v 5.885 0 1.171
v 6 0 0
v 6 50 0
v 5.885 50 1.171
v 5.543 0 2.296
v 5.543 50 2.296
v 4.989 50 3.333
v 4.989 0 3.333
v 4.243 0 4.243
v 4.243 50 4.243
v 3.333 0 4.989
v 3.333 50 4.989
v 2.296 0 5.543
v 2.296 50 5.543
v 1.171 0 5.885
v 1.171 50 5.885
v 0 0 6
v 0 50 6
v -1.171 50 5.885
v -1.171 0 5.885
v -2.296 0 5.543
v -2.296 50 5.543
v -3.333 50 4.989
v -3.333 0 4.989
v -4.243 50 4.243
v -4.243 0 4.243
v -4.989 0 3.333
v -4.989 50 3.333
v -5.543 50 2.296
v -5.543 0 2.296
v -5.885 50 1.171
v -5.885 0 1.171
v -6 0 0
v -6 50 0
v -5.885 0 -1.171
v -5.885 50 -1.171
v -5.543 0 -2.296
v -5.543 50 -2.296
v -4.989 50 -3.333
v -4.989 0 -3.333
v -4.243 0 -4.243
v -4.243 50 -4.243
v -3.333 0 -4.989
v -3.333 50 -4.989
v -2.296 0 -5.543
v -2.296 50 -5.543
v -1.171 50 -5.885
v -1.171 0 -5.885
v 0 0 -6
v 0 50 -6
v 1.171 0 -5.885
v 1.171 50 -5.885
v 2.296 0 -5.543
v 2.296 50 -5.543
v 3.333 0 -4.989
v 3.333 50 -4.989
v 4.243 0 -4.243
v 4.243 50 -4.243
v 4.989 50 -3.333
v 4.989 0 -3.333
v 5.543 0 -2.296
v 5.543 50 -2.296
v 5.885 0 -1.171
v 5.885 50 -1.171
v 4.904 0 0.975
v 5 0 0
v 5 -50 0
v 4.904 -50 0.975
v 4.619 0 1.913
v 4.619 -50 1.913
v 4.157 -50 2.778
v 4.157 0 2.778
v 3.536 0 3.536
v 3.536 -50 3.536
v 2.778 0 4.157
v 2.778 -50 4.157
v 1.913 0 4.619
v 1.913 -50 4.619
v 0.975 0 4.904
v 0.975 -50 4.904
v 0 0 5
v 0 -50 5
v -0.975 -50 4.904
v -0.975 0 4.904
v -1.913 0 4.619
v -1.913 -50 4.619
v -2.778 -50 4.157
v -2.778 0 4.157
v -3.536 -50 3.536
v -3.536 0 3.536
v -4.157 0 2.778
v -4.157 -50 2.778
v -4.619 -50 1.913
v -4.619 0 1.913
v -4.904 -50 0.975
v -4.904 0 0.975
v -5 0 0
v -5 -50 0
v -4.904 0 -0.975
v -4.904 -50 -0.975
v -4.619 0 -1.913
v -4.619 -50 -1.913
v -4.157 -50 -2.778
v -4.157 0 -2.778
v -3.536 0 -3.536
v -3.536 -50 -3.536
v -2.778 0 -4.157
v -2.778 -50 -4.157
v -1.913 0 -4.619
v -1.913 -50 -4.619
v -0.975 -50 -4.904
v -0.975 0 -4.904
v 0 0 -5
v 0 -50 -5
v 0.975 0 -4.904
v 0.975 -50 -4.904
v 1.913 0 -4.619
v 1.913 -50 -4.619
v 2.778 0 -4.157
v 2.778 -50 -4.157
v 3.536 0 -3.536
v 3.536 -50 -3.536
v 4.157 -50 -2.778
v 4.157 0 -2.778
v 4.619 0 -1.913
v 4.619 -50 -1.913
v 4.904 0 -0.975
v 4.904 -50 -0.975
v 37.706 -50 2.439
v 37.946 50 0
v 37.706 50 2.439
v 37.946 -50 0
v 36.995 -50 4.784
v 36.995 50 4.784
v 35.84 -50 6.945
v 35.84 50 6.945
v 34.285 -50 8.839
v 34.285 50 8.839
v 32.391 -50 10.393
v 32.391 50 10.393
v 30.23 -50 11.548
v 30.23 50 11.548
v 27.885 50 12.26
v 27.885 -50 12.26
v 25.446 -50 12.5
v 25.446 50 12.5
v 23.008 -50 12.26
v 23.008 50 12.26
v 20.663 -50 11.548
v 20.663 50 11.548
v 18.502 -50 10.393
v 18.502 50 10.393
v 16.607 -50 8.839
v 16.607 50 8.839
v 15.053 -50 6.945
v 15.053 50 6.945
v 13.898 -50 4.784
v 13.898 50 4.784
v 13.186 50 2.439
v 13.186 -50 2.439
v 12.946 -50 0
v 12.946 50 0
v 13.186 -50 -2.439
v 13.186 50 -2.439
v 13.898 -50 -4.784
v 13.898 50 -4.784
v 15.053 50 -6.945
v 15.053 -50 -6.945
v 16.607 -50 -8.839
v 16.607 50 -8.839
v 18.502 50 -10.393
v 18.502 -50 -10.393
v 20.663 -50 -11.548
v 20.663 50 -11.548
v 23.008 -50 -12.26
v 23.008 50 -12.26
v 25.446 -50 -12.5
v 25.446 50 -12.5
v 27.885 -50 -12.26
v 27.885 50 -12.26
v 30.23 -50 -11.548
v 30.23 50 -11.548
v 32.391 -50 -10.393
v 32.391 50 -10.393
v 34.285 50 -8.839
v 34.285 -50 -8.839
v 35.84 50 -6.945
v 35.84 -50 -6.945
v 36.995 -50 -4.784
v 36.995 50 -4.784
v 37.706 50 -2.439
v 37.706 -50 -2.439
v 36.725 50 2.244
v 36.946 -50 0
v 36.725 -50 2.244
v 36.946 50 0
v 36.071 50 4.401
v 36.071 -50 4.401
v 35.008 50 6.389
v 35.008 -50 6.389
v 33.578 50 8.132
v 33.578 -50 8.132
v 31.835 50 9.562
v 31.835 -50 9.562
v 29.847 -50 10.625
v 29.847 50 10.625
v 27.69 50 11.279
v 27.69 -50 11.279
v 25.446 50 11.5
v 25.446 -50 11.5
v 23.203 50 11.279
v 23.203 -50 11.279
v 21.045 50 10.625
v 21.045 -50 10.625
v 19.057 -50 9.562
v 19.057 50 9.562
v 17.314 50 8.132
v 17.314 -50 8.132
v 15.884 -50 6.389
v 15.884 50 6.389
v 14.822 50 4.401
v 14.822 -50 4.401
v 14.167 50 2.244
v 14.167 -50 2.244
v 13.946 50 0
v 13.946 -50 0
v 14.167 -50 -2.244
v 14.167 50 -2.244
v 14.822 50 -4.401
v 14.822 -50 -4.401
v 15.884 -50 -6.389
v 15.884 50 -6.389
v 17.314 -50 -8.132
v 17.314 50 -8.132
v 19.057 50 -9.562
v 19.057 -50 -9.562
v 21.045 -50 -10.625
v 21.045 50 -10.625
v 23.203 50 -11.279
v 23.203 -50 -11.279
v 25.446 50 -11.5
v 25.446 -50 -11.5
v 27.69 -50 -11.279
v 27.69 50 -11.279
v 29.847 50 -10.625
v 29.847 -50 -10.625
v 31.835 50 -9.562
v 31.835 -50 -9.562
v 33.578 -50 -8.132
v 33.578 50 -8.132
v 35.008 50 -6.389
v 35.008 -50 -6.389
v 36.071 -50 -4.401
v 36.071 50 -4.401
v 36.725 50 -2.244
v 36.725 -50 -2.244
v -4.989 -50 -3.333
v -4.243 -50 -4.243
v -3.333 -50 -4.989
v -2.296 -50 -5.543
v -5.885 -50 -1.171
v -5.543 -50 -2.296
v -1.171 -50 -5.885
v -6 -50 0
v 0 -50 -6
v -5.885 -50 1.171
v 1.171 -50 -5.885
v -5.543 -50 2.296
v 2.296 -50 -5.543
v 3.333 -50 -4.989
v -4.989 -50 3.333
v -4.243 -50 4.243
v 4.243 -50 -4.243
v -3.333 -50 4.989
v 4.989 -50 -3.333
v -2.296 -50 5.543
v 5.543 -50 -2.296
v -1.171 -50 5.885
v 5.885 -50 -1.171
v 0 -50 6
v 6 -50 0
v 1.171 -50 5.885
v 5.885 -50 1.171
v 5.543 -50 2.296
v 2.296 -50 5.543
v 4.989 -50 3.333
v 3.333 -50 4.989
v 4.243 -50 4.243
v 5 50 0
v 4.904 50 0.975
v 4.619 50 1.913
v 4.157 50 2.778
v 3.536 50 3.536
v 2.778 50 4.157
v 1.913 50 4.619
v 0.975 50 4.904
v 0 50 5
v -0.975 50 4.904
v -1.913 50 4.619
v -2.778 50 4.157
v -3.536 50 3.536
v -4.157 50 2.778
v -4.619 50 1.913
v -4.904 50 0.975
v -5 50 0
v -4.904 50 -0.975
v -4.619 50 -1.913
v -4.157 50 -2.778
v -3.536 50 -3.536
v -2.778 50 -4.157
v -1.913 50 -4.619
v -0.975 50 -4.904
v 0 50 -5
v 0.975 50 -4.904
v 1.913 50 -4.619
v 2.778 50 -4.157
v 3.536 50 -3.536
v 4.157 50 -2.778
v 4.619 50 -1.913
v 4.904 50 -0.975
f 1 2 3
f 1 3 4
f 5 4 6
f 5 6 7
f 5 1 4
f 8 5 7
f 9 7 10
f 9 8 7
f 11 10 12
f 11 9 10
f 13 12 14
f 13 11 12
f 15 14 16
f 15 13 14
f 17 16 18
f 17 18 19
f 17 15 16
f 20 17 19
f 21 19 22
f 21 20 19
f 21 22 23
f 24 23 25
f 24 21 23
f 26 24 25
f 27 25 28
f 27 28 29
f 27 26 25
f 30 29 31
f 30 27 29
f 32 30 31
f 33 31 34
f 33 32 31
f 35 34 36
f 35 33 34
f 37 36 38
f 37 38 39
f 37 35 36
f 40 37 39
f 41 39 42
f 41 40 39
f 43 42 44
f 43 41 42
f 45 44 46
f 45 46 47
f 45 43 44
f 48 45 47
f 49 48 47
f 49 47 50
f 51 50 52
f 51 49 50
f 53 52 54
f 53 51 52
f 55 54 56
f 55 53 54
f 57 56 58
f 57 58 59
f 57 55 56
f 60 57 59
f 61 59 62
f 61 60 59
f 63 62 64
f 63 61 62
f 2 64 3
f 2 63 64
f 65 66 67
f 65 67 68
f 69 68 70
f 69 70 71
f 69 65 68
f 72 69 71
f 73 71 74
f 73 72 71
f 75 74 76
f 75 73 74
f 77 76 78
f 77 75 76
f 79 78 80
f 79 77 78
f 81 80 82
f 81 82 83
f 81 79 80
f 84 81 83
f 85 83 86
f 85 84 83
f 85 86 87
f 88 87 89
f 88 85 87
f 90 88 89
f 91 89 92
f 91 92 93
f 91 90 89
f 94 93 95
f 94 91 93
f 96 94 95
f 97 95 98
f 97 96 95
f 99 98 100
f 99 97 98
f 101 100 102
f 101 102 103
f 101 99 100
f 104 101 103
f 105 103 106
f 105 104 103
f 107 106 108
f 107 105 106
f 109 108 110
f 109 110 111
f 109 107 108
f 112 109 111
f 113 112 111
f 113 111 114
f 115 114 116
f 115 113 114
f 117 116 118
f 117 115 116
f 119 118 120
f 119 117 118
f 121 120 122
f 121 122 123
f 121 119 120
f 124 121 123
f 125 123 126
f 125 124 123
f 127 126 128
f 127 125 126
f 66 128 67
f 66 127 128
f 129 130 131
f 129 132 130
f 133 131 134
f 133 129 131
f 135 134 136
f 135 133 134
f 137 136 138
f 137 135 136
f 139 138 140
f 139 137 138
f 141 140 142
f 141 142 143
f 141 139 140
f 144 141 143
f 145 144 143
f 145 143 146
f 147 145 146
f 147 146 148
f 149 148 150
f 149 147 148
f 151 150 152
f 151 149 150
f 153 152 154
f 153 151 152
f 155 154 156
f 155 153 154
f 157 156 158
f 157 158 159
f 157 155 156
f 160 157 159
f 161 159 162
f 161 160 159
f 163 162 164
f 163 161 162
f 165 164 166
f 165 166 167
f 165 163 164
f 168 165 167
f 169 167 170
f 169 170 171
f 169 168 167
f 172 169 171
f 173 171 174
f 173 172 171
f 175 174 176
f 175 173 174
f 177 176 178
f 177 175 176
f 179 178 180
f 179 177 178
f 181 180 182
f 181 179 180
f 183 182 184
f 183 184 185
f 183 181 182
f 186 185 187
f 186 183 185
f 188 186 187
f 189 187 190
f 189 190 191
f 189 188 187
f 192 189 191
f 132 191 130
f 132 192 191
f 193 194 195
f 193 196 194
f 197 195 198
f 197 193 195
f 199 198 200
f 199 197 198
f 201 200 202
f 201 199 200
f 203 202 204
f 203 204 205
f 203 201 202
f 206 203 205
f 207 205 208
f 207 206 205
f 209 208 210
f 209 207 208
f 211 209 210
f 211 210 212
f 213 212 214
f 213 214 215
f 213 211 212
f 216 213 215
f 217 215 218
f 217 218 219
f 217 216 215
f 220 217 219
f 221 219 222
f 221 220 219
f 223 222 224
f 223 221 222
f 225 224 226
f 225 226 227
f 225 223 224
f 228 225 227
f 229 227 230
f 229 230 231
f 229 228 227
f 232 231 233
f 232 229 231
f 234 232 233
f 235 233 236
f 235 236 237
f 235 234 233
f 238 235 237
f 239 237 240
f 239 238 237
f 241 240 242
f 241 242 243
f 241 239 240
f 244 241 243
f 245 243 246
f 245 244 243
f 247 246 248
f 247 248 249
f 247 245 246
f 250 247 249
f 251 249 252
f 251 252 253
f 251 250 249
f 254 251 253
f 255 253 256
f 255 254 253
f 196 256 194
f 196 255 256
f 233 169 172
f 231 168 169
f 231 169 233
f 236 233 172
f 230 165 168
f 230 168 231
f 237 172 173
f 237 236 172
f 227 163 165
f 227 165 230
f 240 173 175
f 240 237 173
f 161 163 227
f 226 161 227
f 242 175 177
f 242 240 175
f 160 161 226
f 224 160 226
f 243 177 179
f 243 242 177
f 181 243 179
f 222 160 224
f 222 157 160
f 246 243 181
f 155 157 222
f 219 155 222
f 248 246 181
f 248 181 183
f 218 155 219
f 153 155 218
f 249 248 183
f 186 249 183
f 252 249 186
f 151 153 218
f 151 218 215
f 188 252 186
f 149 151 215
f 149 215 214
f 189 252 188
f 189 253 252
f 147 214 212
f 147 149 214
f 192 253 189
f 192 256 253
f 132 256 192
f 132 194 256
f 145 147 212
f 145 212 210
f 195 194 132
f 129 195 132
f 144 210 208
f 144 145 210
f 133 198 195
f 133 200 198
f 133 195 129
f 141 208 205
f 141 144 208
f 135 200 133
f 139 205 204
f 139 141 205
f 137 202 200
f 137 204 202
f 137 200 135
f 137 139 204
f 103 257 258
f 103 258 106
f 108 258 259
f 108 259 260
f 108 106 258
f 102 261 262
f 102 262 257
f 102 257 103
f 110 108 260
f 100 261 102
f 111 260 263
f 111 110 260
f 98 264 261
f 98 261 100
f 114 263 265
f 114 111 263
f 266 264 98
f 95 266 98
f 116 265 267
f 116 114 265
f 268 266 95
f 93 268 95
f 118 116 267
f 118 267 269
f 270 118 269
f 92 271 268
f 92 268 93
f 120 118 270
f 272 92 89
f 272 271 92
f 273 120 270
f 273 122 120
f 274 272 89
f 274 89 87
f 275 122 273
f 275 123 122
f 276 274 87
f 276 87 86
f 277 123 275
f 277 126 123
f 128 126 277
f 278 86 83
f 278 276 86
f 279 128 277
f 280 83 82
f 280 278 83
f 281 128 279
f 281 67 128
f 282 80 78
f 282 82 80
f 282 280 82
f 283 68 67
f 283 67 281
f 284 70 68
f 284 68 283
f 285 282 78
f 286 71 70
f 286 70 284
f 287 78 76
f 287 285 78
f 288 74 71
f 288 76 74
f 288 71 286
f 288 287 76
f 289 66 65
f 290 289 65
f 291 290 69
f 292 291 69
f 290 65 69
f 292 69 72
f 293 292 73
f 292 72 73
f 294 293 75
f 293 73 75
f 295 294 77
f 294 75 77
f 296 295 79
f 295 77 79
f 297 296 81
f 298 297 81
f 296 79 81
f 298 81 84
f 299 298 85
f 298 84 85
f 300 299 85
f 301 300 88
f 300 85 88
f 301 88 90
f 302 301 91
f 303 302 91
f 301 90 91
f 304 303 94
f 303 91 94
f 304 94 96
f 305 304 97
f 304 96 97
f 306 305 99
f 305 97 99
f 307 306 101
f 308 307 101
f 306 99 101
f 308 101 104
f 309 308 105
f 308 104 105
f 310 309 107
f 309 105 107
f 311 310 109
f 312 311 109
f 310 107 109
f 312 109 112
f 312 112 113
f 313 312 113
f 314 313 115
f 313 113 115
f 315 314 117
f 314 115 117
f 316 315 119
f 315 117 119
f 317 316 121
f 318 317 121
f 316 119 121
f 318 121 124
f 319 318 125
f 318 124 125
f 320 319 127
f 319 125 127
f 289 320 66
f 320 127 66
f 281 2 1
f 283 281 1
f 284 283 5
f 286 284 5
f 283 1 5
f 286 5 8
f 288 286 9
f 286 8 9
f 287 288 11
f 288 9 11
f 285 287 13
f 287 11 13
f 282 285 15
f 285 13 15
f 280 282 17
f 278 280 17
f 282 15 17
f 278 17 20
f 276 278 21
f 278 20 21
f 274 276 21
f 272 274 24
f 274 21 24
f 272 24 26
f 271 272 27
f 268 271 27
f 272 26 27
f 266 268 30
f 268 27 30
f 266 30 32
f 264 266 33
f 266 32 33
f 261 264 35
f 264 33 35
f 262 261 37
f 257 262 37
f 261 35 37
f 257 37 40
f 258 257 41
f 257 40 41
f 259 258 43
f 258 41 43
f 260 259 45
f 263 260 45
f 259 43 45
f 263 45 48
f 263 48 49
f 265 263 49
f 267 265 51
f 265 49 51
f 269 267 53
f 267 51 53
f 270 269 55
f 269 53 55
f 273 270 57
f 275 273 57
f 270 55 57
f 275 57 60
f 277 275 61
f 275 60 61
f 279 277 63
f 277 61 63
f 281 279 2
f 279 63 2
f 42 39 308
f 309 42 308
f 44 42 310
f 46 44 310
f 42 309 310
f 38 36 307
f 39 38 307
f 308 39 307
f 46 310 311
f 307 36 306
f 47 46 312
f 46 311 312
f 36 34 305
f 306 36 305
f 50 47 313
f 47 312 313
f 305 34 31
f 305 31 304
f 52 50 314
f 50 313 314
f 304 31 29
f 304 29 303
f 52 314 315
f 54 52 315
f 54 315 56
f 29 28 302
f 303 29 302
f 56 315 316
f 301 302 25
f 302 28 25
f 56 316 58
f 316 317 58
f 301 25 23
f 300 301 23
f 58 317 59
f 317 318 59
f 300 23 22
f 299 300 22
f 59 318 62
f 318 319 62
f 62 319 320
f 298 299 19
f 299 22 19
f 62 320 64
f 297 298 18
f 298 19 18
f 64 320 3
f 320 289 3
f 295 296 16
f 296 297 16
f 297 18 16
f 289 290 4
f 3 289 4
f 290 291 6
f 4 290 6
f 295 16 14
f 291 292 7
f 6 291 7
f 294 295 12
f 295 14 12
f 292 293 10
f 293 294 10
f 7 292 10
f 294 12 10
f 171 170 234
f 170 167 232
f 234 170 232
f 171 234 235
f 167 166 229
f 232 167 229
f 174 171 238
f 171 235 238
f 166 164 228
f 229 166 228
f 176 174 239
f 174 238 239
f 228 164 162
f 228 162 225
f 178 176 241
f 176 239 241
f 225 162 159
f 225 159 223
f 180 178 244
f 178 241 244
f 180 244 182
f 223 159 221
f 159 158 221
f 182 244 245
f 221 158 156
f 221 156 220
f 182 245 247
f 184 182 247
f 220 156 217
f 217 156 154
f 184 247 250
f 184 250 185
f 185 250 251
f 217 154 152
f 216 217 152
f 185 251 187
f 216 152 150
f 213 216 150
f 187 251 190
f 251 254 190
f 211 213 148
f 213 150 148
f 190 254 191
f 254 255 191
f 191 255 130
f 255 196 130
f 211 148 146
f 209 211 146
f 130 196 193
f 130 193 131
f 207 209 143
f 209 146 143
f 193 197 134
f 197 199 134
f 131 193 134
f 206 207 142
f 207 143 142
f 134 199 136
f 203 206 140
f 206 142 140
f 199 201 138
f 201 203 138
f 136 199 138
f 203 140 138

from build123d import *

# Parameters (mm, degrees)
F0_R     = 6
F0_R_2   = 5
F0_R_3   = 12.5
F0_R_4   = 11.5
F1_DEPTH = 50


with BuildPart() as f1:
    # F0 (on Front) → F1 (new body, symmetric)
    with BuildSketch(Plane.XZ):
        Circle(F0_R)
        Circle(F0_R_2, mode=Mode.SUBTRACT)
        with Locations((25.446169, 0)):
            Circle(F0_R_3)
        with Locations((25.446169, 0)):
            Circle(F0_R_4, mode=Mode.SUBTRACT)
    extrude(amount=F1_DEPTH, both=True)


solid = f1.part
